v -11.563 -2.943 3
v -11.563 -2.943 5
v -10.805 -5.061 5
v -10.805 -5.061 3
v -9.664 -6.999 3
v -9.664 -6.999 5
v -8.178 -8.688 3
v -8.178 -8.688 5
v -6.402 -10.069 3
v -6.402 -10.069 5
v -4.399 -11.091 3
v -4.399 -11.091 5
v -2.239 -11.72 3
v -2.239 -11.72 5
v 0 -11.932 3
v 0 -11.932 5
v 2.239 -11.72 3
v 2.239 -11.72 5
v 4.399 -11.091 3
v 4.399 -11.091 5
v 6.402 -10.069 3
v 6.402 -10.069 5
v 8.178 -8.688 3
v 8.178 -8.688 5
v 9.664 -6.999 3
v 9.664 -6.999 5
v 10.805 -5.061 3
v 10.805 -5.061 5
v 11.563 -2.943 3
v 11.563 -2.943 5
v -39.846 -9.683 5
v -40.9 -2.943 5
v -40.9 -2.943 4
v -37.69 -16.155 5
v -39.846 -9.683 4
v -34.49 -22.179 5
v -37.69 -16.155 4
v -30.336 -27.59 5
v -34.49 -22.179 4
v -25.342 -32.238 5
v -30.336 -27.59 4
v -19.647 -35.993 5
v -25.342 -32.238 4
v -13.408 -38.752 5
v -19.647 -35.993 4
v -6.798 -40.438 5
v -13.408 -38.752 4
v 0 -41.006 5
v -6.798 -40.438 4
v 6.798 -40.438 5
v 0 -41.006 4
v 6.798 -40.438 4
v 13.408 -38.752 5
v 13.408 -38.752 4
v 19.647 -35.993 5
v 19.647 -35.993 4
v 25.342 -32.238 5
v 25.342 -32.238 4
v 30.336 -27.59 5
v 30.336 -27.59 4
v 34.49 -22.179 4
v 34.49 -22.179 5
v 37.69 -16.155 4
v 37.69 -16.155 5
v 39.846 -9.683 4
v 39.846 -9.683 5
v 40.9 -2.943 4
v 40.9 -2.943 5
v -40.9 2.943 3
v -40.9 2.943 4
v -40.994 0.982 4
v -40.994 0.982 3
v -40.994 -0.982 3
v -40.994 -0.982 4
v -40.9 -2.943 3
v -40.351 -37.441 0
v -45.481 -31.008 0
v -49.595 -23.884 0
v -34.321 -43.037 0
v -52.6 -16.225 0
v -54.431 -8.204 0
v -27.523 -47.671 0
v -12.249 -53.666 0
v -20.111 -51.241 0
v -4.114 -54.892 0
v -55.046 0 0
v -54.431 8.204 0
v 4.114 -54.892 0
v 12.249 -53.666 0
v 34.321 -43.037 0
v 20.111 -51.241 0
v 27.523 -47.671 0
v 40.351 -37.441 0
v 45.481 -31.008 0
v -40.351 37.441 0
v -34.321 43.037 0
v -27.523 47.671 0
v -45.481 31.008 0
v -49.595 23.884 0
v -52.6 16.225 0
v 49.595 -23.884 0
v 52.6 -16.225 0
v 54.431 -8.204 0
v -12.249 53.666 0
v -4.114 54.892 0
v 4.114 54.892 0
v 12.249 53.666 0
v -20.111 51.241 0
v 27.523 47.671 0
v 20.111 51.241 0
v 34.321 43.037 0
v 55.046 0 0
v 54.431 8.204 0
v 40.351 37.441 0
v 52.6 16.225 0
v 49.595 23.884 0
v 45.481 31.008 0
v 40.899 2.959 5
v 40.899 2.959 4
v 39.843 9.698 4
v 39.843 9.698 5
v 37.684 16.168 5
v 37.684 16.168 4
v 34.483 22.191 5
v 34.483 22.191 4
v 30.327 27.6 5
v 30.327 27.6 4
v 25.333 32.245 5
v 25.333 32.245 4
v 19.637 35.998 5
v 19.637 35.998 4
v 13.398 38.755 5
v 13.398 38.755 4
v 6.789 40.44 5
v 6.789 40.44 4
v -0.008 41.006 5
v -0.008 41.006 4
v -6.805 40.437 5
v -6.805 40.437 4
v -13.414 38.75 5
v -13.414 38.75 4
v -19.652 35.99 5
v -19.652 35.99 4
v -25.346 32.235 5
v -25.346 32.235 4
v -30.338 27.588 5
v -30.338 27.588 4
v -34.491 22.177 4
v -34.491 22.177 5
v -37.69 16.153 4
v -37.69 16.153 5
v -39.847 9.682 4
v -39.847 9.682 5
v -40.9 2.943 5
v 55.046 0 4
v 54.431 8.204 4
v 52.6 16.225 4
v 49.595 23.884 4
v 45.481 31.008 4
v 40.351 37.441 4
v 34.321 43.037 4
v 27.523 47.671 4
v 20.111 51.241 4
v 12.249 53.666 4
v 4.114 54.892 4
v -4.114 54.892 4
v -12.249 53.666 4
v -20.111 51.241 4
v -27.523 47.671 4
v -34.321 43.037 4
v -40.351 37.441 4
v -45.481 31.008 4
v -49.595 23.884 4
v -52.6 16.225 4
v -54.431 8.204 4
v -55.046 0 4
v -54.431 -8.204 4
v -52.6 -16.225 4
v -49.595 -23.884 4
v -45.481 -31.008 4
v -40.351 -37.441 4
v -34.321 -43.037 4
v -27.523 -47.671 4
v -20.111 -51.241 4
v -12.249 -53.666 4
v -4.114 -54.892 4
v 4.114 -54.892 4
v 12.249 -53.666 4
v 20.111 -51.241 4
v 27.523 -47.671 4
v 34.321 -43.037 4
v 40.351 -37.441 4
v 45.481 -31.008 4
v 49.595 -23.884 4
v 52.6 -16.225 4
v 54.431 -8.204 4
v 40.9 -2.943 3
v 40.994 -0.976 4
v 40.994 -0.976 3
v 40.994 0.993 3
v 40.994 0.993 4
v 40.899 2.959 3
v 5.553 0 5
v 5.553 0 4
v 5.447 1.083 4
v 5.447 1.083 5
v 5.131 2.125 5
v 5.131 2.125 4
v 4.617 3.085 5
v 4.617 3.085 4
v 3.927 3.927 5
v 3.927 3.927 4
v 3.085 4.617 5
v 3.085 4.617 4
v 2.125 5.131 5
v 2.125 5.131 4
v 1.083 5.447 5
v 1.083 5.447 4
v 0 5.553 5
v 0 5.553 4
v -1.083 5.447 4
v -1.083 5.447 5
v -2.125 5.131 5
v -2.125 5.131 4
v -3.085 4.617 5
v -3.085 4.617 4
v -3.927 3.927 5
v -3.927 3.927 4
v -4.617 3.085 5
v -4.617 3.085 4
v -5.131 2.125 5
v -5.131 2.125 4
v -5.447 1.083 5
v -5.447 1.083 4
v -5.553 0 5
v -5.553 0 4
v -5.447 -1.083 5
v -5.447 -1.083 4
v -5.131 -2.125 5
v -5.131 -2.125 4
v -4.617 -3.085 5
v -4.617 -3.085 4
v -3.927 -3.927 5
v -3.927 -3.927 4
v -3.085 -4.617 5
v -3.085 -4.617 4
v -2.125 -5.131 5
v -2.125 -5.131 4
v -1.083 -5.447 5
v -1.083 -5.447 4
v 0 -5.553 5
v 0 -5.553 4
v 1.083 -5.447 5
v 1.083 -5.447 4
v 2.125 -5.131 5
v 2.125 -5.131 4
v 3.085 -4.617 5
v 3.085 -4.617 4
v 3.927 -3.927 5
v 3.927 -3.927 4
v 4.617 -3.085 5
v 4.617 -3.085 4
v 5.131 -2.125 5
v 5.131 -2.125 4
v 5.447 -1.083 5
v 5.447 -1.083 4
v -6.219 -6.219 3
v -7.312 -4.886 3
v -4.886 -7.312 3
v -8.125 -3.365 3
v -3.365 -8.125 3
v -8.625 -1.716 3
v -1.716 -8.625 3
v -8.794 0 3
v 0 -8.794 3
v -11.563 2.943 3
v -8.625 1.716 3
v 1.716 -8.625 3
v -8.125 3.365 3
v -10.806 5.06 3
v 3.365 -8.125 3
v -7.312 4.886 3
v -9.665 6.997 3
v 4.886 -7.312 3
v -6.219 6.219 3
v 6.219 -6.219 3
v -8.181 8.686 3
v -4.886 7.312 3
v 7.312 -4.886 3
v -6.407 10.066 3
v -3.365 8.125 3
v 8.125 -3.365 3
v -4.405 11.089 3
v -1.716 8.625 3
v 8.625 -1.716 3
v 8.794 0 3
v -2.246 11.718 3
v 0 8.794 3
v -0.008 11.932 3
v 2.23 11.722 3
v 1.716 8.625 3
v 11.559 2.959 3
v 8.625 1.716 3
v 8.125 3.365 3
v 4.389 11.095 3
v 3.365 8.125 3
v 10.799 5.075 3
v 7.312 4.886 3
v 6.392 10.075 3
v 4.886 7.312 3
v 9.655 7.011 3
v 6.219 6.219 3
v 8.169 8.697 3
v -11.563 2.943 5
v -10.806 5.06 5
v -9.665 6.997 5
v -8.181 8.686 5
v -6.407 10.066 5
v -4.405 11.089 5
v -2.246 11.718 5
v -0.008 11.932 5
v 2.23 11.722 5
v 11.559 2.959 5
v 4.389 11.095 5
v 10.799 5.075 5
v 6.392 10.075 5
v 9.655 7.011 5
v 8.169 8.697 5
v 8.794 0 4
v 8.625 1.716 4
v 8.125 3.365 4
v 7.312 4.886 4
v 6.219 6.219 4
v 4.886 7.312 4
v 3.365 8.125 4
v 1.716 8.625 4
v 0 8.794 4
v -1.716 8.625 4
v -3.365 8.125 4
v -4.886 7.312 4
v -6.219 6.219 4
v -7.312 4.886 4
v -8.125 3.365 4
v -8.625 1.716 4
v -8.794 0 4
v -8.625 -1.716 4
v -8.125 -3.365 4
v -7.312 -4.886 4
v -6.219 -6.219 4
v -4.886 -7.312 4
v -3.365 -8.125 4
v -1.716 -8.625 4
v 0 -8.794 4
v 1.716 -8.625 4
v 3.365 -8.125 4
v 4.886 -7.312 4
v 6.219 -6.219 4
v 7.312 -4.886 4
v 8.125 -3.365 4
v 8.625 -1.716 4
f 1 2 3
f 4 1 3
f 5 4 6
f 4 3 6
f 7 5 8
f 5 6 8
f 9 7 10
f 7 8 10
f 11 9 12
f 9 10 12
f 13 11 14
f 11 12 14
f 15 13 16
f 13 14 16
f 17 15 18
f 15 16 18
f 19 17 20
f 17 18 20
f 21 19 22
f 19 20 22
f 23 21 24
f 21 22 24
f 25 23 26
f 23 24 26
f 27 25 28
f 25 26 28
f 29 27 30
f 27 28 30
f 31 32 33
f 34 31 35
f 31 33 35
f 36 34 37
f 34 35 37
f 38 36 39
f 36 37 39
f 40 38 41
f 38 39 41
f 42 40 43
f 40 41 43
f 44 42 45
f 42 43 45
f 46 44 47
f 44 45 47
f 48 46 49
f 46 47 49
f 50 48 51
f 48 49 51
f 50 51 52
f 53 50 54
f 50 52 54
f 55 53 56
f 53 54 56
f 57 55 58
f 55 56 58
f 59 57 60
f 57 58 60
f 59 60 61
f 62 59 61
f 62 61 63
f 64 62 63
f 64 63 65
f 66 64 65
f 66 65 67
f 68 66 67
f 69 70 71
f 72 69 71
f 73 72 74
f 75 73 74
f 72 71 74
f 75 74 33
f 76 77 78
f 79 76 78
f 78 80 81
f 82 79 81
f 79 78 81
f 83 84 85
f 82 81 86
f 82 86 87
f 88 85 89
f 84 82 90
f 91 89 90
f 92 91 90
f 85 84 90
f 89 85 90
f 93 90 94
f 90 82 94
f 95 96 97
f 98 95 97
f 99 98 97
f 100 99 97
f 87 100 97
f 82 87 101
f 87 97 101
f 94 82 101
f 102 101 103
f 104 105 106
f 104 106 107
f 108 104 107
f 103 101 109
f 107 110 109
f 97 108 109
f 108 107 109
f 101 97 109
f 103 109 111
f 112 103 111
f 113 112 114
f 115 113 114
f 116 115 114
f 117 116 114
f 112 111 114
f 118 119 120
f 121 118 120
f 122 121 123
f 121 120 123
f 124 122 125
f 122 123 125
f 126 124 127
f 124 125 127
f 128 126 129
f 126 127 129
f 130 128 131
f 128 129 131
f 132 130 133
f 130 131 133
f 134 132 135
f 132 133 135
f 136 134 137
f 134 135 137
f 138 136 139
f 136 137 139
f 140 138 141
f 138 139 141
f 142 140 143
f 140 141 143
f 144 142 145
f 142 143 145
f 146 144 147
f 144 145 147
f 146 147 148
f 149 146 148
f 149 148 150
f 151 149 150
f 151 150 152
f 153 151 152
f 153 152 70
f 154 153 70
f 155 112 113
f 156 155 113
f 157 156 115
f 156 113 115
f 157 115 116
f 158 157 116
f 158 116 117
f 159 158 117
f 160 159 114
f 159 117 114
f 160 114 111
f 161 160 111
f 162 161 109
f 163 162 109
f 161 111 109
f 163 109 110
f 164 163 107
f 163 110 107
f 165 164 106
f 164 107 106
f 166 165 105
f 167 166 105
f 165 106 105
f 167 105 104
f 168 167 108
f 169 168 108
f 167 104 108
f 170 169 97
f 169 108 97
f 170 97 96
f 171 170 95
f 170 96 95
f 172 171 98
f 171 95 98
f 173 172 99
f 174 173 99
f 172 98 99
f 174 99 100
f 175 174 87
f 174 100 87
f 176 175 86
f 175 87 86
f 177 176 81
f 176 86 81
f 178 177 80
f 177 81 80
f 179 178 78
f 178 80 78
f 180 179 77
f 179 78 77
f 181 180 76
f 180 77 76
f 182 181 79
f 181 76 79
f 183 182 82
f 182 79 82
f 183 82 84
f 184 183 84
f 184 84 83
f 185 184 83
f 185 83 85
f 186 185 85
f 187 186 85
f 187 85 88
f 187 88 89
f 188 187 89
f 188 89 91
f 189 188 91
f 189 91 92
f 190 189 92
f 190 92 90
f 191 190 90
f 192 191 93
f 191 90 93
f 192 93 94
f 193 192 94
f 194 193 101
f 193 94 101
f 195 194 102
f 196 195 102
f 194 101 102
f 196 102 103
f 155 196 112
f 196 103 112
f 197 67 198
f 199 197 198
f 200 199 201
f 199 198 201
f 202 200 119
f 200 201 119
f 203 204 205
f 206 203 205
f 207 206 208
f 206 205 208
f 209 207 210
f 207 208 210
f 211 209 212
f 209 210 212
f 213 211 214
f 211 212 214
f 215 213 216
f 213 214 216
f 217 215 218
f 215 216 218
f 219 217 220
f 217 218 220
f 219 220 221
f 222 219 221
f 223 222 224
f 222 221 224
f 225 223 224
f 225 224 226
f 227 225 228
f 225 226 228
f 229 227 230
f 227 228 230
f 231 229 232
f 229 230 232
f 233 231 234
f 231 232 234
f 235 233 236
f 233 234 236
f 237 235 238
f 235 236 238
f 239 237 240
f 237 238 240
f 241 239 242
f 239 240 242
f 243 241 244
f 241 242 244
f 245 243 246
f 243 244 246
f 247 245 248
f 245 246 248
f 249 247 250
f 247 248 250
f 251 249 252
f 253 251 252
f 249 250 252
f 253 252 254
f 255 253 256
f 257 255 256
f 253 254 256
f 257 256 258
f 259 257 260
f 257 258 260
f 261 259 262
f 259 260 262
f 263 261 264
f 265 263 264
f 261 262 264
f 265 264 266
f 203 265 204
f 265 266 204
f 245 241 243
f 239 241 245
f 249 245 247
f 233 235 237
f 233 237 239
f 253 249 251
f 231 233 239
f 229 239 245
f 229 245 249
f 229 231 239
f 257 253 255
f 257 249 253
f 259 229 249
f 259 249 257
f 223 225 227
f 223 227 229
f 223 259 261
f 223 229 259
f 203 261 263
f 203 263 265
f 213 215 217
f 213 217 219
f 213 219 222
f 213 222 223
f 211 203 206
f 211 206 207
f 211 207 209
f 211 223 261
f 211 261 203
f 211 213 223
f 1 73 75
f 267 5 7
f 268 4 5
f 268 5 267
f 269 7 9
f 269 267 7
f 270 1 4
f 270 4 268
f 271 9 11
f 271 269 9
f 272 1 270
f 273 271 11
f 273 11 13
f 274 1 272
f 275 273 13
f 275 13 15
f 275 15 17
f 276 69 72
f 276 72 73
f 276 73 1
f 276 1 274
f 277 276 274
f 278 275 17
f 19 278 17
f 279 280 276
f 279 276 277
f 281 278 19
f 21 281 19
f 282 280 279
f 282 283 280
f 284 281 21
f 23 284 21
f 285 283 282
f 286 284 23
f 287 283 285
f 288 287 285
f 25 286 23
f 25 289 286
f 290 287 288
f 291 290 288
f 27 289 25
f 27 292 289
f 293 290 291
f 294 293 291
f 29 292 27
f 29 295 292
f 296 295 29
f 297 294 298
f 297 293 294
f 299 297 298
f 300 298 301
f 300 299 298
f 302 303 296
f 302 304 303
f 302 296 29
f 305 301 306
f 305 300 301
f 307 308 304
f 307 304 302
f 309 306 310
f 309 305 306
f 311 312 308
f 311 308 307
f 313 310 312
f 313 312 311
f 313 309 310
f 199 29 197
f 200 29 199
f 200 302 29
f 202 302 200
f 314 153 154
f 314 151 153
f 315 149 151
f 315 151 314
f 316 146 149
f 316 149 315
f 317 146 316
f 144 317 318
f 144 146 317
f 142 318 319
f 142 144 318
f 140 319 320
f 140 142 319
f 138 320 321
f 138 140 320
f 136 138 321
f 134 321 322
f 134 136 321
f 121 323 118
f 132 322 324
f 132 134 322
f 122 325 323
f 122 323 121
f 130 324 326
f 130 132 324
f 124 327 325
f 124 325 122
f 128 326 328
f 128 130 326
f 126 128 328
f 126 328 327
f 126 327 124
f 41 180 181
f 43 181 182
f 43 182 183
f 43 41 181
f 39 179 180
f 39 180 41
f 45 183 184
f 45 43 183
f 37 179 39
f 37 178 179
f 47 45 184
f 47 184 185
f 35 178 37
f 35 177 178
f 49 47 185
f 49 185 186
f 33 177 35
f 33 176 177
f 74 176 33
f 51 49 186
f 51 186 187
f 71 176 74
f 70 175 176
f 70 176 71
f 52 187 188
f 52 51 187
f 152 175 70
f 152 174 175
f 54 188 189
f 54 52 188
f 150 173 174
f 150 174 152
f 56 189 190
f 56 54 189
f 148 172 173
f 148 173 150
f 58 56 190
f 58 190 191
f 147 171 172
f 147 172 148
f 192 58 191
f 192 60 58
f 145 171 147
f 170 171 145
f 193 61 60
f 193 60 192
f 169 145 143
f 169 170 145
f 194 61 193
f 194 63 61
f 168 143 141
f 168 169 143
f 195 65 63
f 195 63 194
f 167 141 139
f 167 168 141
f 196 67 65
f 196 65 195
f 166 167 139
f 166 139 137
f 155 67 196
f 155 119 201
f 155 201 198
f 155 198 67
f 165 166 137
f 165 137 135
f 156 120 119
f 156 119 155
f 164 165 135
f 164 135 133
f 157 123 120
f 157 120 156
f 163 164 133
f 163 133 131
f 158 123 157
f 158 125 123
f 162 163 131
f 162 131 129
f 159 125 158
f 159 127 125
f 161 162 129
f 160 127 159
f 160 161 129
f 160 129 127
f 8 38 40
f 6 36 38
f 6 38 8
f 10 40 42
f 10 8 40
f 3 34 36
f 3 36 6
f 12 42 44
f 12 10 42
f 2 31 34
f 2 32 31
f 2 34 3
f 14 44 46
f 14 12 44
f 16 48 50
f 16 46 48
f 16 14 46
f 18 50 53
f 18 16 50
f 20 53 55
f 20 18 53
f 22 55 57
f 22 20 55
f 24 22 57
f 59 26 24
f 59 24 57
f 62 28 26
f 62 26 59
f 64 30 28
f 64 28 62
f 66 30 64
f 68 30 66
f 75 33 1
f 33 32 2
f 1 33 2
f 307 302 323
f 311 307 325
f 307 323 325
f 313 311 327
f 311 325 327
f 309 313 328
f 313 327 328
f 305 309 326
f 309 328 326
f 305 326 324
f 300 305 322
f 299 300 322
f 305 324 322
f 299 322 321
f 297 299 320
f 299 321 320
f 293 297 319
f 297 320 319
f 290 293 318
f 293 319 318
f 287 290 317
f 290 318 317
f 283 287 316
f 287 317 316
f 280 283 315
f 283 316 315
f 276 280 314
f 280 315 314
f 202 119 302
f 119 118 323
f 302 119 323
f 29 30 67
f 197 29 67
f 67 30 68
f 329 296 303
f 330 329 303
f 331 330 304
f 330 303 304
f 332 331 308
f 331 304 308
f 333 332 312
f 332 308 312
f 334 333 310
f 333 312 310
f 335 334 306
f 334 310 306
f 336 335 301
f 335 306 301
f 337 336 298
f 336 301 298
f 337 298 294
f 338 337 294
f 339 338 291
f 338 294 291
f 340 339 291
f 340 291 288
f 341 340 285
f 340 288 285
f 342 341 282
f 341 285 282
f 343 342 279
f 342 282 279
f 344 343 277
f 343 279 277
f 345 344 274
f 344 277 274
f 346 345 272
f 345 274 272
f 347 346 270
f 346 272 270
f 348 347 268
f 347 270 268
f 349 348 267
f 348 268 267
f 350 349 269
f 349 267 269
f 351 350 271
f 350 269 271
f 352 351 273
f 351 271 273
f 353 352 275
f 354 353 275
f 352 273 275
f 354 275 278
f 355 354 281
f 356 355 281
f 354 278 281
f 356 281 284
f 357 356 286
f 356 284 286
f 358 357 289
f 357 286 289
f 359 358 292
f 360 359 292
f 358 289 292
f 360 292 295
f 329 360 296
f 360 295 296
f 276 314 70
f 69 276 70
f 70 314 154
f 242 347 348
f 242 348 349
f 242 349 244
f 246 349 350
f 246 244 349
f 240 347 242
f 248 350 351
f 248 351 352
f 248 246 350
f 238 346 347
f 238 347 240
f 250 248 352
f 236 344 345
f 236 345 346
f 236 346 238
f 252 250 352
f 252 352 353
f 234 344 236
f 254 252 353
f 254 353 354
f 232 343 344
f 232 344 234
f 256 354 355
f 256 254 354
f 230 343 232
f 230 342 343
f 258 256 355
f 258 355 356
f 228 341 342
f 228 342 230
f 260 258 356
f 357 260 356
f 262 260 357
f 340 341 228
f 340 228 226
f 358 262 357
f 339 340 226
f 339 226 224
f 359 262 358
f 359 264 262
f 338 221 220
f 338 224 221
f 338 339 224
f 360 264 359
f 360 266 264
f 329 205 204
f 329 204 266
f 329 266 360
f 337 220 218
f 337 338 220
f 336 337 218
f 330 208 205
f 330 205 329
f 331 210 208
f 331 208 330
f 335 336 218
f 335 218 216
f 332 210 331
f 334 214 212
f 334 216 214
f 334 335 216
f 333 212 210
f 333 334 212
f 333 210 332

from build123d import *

# Parameters (mm, degrees)
F0_R      = 55.0458583504
F1_DEPTH  = 4
F2_R      = 41.0058886934
F3_DEPTH  = 1
F4_R      = 11.9318178019
F5_DEPTH  = 2
F6_R      = 8.7944266384
F7_DEPTH  = 1
F8_R      = 5.553220806
F9_DEPTH  = 1
F11_DEPTH = 2
F13_DEPTH = 2


with BuildPart() as f1:
    # F0 (on Top) → F1 (new body)
    with BuildSketch(Plane.XY):
        Circle(F0_R)
    extrude(amount=F1_DEPTH)

    # F2 (on face) → F3 (join)
    with BuildSketch(Plane.XY.offset(4)):
        Circle(F2_R)
    extrude(amount=F3_DEPTH)

    # F4 (on face) → F5 (cut)
    with BuildSketch(Plane.XY.offset(5)):
        Circle(F4_R)
    extrude(amount=-F5_DEPTH, mode=Mode.SUBTRACT)

    # F6 (on face) → F7 (join)
    with BuildSketch(Plane.XY.offset(3)):
        Circle(F6_R)
    extrude(amount=F7_DEPTH)

    # F8 (on face) → F9 (join)
    with BuildSketch(Plane.XY.offset(4)):
        Circle(F8_R)
    extrude(amount=F9_DEPTH)

    # F10 (on face) → F11 (cut)
    with BuildSketch(Plane.XY.offset(5)):
        with BuildLine():
            Line((-11.5631810567, 2.9429780682), (-40.9001441028, 2.9429780682))
            ThreePointArc((-40.9001441028, 2.9429780682), (-41.0058886934, 0), (-40.9001441028, -2.9429780682))
            Line((-40.9001441028, -2.9429780682), (-11.5631810567, -2.9429780682))
            ThreePointArc((-11.5631810567, -2.9429780682), (-11.9318178019, 0), (-11.5631810567, 2.9429780682))
        make_face()
    extrude(amount=-F11_DEPTH, mode=Mode.SUBTRACT)

    # F12 (on face) → F13 (cut)
    with BuildSketch(Plane.XY.offset(5)):
        with BuildLine():
            Line((40.8989598294, 2.959390547), (11.5589914633, 2.959390547))
            ThreePointArc((11.5589914633, 2.959390547), (11.9318147961, 0.0084693883), (11.5631810567, -2.9429780682))
            Line((11.5631810567, -2.9429780682), (40.9001441028, -2.9429780682))
            ThreePointArc((40.9001441028, -2.9429780682), (41.005887868, 0.008227575), (40.8989598294, 2.959390547))
        make_face()
    extrude(amount=-F13_DEPTH, mode=Mode.SUBTRACT)


solid = f1.part
